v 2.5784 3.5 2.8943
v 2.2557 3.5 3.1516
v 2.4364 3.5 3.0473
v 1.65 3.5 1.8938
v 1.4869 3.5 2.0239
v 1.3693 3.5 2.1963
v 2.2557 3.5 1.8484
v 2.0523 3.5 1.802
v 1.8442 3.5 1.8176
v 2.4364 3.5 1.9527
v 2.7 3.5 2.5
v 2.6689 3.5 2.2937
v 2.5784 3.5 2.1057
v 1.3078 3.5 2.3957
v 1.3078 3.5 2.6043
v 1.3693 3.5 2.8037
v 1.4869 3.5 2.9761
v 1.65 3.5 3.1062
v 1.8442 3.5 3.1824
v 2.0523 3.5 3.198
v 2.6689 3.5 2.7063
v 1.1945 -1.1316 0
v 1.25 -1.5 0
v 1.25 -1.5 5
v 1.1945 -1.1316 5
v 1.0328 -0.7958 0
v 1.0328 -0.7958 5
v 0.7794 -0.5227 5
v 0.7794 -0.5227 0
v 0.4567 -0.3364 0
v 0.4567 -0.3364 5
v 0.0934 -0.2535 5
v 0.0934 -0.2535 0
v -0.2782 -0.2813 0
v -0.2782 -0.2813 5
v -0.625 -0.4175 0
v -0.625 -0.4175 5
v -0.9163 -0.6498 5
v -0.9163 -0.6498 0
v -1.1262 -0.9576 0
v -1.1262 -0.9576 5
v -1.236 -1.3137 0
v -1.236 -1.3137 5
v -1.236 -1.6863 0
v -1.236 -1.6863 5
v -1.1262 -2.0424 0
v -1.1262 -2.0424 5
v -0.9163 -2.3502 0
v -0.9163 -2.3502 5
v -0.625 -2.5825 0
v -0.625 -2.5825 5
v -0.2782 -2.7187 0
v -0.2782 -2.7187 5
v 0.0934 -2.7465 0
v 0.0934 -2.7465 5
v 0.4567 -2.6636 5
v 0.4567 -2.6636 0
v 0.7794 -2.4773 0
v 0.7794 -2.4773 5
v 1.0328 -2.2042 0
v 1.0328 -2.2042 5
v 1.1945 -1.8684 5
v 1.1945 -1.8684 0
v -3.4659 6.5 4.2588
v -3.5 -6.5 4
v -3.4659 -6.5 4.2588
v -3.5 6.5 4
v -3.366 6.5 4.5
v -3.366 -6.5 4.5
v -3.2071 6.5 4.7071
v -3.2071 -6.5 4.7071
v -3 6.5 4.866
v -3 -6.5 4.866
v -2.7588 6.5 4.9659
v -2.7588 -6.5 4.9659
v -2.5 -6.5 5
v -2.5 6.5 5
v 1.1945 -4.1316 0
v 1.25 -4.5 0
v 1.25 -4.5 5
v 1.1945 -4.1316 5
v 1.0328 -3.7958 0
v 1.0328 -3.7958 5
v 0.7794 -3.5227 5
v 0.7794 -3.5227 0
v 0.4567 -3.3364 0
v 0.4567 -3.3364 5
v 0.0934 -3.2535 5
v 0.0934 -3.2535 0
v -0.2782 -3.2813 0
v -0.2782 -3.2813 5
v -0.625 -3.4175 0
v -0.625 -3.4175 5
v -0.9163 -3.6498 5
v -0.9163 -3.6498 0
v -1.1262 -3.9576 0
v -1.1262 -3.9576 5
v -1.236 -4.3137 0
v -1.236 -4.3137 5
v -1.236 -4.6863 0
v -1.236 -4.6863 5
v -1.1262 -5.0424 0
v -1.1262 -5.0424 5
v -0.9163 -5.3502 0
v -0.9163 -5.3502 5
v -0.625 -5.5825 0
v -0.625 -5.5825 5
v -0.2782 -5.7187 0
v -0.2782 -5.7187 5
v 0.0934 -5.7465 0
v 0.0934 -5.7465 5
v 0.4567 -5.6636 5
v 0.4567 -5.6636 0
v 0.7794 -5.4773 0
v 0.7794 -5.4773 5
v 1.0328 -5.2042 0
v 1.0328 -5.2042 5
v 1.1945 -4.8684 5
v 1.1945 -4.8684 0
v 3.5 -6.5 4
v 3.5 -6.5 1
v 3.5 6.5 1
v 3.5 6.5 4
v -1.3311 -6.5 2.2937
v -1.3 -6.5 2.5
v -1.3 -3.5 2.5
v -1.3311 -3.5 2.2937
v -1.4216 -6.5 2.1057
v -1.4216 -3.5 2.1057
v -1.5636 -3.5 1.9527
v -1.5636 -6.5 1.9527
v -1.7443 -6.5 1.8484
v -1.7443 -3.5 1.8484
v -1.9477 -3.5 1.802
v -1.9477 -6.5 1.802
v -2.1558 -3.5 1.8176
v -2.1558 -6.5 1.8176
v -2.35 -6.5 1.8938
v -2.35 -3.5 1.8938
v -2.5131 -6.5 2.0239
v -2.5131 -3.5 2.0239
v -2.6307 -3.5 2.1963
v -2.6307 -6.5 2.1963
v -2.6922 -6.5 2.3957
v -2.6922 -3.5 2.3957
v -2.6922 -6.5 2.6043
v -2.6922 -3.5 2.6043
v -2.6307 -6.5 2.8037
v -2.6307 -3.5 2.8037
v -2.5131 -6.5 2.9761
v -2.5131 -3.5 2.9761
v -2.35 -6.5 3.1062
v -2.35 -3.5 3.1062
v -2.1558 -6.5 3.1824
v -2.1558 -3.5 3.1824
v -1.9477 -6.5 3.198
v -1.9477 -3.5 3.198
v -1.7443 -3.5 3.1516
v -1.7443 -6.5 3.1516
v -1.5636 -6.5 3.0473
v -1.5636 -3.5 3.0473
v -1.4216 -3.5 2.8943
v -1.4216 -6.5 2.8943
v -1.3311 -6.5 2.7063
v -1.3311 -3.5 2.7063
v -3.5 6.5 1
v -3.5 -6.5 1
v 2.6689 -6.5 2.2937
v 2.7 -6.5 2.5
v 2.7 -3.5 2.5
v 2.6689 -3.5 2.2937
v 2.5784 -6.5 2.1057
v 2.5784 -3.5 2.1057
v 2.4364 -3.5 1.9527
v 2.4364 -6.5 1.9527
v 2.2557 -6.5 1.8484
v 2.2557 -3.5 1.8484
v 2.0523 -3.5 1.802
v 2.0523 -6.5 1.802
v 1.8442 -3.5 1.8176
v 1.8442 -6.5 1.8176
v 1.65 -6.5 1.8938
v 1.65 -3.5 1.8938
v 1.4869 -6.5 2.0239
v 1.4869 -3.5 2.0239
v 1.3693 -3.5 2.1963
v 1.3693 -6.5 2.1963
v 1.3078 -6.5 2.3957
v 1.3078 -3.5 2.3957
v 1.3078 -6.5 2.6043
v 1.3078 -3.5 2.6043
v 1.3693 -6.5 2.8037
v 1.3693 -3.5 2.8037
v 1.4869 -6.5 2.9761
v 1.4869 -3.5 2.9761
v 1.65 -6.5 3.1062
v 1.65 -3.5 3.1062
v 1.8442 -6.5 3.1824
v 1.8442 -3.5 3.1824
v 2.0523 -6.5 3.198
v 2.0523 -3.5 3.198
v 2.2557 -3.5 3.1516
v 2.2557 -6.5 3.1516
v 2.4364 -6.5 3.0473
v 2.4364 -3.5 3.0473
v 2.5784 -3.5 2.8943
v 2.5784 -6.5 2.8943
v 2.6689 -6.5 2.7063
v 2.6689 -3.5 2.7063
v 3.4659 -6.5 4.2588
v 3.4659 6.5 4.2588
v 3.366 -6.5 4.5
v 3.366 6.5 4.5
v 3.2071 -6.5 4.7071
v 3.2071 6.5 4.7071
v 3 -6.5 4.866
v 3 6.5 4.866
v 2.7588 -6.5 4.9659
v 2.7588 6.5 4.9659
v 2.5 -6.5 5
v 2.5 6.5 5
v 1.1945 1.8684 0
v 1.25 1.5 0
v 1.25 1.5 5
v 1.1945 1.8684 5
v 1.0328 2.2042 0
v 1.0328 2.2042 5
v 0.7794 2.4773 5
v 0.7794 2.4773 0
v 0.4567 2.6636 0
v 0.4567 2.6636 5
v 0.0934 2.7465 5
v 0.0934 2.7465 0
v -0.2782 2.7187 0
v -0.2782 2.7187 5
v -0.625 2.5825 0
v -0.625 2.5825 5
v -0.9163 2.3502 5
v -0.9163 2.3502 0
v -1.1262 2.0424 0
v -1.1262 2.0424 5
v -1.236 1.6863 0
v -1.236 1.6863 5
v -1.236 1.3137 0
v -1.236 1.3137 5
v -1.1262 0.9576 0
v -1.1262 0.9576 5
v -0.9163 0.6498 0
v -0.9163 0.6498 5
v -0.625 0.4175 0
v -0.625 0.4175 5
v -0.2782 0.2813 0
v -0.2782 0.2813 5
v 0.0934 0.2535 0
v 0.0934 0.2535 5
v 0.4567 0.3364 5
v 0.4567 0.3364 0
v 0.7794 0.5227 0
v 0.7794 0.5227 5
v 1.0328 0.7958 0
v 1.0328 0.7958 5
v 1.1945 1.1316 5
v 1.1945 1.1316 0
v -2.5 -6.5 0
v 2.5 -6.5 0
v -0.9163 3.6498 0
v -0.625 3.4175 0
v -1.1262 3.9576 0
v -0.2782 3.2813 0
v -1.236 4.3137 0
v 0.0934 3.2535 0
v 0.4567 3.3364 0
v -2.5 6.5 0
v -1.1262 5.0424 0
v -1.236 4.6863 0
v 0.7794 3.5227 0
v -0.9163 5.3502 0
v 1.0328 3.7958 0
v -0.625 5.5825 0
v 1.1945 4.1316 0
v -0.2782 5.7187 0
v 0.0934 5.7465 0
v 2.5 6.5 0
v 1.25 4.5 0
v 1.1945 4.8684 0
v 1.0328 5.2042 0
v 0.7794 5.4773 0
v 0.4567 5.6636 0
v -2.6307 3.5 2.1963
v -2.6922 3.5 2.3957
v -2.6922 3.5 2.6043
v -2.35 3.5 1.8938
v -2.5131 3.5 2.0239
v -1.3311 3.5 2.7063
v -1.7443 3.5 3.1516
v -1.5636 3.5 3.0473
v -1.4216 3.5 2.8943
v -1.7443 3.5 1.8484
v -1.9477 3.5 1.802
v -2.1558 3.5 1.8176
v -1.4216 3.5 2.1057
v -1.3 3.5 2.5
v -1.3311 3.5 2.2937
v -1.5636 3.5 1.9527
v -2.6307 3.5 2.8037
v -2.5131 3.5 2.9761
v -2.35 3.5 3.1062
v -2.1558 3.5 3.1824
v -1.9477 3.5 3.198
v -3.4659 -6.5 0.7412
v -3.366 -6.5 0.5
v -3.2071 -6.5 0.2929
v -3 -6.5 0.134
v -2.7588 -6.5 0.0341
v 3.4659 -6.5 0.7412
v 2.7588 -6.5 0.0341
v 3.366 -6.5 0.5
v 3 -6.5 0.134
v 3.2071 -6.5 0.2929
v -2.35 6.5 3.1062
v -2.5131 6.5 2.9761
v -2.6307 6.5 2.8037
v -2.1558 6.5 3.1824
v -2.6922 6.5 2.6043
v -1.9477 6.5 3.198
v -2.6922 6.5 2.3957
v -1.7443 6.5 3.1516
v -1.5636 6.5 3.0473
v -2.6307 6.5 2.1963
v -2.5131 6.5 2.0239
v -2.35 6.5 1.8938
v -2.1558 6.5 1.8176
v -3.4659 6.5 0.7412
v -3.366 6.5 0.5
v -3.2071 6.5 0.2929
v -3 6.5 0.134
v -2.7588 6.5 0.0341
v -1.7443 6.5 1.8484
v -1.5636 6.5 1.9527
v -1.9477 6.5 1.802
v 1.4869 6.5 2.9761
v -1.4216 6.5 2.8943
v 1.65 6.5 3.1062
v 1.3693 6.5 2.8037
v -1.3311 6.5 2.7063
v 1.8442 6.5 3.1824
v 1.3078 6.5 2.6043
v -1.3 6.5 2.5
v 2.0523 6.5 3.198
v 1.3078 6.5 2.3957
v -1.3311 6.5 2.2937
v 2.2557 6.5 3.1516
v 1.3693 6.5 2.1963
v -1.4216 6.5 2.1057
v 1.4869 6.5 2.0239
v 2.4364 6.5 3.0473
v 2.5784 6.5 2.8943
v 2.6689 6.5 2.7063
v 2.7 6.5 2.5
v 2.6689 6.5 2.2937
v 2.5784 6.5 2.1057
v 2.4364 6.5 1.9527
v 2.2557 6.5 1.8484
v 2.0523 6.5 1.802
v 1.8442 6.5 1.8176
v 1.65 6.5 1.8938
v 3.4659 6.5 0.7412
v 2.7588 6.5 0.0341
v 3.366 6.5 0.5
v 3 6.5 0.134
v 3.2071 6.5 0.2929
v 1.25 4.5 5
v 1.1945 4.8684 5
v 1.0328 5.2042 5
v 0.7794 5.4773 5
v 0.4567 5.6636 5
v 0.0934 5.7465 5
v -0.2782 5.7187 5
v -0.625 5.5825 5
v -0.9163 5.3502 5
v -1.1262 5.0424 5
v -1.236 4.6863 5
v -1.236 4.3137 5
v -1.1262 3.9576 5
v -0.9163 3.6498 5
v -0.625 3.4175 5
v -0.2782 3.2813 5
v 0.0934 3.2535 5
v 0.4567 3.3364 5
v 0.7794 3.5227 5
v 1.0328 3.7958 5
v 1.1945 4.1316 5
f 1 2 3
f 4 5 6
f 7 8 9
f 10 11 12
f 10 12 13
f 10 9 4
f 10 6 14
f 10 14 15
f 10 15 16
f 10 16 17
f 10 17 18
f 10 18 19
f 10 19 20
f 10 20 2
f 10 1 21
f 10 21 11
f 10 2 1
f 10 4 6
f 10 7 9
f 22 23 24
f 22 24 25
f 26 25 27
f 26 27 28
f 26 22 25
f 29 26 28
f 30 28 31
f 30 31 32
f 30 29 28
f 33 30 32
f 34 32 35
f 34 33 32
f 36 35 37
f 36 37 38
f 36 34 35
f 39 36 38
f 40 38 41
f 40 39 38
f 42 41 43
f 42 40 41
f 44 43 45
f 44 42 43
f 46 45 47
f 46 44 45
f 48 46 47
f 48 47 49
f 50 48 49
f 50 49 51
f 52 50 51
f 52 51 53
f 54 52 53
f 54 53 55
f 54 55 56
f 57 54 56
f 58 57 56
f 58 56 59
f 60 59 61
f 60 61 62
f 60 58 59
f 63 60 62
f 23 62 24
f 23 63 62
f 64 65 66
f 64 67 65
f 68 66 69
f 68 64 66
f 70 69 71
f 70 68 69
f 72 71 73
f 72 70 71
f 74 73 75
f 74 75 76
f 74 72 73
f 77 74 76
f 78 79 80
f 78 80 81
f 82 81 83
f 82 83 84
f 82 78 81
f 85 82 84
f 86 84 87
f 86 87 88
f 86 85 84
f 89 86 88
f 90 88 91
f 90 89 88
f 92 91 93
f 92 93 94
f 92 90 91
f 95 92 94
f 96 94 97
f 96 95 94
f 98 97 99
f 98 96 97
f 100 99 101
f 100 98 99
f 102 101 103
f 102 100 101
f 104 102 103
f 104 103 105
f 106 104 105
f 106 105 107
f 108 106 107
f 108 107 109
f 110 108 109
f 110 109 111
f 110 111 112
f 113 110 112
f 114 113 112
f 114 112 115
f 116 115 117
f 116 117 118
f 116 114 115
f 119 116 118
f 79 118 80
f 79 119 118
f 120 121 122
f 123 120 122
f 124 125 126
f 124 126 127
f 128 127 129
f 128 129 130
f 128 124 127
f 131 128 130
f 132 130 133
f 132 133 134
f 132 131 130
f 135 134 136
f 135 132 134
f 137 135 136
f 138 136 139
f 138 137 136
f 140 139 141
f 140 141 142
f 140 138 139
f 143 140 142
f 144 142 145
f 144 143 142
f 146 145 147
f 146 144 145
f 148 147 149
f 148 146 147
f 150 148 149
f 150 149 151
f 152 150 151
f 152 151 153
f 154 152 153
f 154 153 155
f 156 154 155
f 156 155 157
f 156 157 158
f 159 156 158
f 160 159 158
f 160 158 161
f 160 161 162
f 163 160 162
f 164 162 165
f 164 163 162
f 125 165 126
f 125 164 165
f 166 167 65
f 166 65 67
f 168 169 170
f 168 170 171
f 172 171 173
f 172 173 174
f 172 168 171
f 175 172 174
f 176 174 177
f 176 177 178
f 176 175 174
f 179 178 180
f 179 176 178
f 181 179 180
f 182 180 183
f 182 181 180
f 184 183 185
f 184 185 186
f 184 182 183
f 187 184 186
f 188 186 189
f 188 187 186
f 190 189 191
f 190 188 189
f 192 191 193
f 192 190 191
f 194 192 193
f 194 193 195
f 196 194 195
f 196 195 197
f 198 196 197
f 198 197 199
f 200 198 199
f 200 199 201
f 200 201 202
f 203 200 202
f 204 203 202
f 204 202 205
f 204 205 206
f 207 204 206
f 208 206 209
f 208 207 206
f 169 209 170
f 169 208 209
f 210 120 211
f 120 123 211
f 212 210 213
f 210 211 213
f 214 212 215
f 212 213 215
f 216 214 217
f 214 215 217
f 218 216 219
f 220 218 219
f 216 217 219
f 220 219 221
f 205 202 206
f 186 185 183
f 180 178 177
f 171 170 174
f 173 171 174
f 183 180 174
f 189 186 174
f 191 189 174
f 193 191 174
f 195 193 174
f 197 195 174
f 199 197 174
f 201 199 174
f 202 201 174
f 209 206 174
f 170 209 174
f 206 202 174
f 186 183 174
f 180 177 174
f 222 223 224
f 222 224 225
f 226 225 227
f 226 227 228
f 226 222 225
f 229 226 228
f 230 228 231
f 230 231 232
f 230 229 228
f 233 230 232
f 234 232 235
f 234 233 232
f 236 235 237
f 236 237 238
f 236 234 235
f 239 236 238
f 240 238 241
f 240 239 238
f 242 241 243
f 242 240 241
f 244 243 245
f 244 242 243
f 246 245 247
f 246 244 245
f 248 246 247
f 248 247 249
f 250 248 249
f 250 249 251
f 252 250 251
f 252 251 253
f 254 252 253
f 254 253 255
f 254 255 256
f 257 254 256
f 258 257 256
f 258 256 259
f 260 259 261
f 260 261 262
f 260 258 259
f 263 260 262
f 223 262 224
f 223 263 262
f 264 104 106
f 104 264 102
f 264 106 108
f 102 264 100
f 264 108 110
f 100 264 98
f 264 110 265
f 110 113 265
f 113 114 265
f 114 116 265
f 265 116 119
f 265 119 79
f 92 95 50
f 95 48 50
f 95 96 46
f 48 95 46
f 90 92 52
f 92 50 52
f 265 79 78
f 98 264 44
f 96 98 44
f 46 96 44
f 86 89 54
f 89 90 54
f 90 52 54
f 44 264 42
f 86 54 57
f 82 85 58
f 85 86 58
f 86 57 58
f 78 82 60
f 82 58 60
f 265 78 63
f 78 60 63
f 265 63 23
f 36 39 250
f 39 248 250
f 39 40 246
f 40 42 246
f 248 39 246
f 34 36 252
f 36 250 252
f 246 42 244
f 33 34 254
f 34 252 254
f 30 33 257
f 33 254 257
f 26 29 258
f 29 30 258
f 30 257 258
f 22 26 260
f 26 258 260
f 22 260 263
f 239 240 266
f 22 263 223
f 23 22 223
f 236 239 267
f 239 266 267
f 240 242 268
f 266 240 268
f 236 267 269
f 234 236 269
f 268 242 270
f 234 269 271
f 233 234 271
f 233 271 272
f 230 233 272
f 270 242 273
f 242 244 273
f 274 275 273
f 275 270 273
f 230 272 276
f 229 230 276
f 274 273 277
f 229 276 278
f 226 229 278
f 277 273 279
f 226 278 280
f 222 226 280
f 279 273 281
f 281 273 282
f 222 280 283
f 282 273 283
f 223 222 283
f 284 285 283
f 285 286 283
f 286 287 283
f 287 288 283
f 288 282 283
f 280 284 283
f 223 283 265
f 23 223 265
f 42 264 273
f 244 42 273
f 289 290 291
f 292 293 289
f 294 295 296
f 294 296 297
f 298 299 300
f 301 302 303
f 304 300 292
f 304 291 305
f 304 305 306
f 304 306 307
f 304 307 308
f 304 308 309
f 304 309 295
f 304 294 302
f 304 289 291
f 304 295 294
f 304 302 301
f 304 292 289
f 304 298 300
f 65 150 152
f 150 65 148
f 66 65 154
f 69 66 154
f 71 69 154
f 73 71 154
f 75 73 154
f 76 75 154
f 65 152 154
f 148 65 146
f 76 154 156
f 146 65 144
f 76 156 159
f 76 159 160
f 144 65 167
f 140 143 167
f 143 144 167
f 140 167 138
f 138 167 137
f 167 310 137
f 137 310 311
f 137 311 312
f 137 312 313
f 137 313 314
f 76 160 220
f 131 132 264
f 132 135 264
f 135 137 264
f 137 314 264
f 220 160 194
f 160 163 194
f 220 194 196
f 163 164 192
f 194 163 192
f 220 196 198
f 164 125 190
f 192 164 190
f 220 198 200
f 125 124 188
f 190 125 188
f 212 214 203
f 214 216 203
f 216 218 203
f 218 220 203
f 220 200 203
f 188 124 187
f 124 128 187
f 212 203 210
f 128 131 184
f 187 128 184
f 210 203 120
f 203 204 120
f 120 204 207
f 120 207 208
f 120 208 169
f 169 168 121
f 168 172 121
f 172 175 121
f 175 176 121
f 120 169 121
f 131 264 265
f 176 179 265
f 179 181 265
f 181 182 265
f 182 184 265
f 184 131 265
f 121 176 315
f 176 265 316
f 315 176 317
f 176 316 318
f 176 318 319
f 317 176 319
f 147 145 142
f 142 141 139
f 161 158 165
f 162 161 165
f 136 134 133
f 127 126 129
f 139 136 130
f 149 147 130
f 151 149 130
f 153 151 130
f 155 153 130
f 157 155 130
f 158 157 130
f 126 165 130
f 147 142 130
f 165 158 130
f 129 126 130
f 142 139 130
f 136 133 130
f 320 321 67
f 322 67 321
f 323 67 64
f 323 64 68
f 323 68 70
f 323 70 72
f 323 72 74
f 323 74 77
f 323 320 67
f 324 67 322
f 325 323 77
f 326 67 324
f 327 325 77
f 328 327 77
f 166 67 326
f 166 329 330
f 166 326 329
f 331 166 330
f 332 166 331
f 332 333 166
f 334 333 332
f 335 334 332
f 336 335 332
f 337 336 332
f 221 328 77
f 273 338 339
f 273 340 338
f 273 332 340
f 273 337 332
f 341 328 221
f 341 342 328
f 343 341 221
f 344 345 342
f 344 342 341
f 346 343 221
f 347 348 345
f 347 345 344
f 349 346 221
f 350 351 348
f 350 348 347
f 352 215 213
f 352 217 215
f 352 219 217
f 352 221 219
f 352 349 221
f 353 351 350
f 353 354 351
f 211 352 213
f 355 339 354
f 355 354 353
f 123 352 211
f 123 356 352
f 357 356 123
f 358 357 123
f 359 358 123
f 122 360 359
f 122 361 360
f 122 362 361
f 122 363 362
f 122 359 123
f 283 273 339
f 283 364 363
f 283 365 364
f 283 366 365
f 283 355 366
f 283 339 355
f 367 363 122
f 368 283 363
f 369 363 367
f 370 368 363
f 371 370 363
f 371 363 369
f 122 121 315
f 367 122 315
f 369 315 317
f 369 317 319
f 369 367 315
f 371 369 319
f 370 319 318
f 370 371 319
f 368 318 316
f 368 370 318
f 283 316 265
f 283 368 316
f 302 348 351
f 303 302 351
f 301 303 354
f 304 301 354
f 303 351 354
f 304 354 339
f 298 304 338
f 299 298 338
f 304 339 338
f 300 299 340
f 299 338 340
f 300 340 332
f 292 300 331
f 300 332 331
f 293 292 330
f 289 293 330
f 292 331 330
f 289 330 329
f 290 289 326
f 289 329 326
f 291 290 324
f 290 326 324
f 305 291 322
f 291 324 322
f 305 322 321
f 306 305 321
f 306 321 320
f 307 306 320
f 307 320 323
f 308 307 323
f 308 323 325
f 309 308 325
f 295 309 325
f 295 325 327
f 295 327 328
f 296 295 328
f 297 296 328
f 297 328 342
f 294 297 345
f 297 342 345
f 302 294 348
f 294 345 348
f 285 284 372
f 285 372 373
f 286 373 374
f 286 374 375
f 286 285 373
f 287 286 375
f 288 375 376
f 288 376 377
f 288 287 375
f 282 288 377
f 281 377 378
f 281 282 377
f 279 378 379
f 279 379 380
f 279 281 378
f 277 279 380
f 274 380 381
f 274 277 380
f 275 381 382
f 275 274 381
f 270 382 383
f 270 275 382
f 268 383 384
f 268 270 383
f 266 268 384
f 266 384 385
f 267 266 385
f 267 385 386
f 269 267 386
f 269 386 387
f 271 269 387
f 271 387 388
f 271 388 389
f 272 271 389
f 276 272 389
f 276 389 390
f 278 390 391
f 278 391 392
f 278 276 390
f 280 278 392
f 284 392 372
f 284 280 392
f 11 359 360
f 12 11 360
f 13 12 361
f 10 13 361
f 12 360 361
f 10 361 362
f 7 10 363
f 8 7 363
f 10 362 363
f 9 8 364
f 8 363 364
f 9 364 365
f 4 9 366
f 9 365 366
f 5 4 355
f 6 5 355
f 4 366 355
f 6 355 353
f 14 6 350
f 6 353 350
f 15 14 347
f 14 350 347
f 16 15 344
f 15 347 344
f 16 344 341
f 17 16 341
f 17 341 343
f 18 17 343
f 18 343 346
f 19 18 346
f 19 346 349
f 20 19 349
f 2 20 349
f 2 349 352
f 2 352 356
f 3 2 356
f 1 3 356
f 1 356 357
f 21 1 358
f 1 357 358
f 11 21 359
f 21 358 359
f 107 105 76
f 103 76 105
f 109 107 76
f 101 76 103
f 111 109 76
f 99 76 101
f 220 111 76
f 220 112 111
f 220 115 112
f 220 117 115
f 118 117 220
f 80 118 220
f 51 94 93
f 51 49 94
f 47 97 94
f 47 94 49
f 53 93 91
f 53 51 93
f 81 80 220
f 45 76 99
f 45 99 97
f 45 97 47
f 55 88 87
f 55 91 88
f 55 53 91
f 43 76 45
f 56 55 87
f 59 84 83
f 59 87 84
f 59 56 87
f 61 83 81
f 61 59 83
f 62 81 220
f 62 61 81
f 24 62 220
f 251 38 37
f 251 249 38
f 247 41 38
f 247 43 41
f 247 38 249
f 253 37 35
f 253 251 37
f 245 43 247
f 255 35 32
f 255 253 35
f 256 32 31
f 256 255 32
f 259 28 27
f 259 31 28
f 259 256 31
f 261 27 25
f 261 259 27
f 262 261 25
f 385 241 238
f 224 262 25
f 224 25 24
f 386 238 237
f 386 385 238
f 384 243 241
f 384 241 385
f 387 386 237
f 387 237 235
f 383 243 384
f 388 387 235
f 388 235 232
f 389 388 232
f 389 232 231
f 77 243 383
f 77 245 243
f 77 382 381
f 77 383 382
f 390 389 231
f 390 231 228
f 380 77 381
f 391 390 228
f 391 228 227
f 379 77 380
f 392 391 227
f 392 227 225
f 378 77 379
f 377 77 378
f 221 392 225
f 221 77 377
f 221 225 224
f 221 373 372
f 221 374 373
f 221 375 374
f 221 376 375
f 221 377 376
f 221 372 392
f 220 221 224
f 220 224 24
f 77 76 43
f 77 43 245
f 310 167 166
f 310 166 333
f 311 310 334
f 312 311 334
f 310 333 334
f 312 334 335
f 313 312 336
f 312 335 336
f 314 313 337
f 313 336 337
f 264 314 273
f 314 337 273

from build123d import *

# Parameters (mm, degrees)
SKETCH2_W           = 7
SKETCH2_H           = 13
SKETCH2_R           = 1.25
BOSS_EXTRUDE1_DEPTH = 5
FILLET1_R           = 1
SKETCH3_R           = 0.7
CUT_EXTRUDE1_DEPTH  = 3


with BuildPart() as part:
    # Sketch2 → Boss-Extrude1 (new body)
    with BuildSketch(Plane.XY):
        Rectangle(SKETCH2_W, SKETCH2_H)
        with Locations((0, 4.5)):
            Circle(SKETCH2_R, mode=Mode.SUBTRACT)
        with Locations((0, 1.5)):
            Circle(SKETCH2_R, mode=Mode.SUBTRACT)
        with Locations((0, -1.5)):
            Circle(SKETCH2_R, mode=Mode.SUBTRACT)
        with Locations((0, -4.5)):
            Circle(SKETCH2_R, mode=Mode.SUBTRACT)
    extrude(amount=BOSS_EXTRUDE1_DEPTH)

    # Fillet1
    fillet1_edges = [part.edges().sort_by_distance(p)[0] for p in [
        (-3.5, 0, 0),
        (3.5, 0, 0),
        (3.5, 0, 5),
        (-3.5, 0, 5),
    ]]
    fillet(fillet1_edges, radius=FILLET1_R)

    # Sketch3 → Cut-Extrude1 (cut)
    with BuildSketch(Plane(origin=(0, 6.5, 0), x_dir=(1, 0, 0), z_dir=(0, 1, 0))):
        with Locations((-2, -2.5)):
            Circle(SKETCH3_R)
        with Locations((2, -2.5)):
            Circle(SKETCH3_R)
    cut_extrude1 = extrude(amount=-CUT_EXTRUDE1_DEPTH, mode=Mode.SUBTRACT)

    # Mirror1: Cut-Extrude1 across plane
    add(cut_extrude1.mirror(Plane.ZX), mode=Mode.SUBTRACT)


solid = part.part
